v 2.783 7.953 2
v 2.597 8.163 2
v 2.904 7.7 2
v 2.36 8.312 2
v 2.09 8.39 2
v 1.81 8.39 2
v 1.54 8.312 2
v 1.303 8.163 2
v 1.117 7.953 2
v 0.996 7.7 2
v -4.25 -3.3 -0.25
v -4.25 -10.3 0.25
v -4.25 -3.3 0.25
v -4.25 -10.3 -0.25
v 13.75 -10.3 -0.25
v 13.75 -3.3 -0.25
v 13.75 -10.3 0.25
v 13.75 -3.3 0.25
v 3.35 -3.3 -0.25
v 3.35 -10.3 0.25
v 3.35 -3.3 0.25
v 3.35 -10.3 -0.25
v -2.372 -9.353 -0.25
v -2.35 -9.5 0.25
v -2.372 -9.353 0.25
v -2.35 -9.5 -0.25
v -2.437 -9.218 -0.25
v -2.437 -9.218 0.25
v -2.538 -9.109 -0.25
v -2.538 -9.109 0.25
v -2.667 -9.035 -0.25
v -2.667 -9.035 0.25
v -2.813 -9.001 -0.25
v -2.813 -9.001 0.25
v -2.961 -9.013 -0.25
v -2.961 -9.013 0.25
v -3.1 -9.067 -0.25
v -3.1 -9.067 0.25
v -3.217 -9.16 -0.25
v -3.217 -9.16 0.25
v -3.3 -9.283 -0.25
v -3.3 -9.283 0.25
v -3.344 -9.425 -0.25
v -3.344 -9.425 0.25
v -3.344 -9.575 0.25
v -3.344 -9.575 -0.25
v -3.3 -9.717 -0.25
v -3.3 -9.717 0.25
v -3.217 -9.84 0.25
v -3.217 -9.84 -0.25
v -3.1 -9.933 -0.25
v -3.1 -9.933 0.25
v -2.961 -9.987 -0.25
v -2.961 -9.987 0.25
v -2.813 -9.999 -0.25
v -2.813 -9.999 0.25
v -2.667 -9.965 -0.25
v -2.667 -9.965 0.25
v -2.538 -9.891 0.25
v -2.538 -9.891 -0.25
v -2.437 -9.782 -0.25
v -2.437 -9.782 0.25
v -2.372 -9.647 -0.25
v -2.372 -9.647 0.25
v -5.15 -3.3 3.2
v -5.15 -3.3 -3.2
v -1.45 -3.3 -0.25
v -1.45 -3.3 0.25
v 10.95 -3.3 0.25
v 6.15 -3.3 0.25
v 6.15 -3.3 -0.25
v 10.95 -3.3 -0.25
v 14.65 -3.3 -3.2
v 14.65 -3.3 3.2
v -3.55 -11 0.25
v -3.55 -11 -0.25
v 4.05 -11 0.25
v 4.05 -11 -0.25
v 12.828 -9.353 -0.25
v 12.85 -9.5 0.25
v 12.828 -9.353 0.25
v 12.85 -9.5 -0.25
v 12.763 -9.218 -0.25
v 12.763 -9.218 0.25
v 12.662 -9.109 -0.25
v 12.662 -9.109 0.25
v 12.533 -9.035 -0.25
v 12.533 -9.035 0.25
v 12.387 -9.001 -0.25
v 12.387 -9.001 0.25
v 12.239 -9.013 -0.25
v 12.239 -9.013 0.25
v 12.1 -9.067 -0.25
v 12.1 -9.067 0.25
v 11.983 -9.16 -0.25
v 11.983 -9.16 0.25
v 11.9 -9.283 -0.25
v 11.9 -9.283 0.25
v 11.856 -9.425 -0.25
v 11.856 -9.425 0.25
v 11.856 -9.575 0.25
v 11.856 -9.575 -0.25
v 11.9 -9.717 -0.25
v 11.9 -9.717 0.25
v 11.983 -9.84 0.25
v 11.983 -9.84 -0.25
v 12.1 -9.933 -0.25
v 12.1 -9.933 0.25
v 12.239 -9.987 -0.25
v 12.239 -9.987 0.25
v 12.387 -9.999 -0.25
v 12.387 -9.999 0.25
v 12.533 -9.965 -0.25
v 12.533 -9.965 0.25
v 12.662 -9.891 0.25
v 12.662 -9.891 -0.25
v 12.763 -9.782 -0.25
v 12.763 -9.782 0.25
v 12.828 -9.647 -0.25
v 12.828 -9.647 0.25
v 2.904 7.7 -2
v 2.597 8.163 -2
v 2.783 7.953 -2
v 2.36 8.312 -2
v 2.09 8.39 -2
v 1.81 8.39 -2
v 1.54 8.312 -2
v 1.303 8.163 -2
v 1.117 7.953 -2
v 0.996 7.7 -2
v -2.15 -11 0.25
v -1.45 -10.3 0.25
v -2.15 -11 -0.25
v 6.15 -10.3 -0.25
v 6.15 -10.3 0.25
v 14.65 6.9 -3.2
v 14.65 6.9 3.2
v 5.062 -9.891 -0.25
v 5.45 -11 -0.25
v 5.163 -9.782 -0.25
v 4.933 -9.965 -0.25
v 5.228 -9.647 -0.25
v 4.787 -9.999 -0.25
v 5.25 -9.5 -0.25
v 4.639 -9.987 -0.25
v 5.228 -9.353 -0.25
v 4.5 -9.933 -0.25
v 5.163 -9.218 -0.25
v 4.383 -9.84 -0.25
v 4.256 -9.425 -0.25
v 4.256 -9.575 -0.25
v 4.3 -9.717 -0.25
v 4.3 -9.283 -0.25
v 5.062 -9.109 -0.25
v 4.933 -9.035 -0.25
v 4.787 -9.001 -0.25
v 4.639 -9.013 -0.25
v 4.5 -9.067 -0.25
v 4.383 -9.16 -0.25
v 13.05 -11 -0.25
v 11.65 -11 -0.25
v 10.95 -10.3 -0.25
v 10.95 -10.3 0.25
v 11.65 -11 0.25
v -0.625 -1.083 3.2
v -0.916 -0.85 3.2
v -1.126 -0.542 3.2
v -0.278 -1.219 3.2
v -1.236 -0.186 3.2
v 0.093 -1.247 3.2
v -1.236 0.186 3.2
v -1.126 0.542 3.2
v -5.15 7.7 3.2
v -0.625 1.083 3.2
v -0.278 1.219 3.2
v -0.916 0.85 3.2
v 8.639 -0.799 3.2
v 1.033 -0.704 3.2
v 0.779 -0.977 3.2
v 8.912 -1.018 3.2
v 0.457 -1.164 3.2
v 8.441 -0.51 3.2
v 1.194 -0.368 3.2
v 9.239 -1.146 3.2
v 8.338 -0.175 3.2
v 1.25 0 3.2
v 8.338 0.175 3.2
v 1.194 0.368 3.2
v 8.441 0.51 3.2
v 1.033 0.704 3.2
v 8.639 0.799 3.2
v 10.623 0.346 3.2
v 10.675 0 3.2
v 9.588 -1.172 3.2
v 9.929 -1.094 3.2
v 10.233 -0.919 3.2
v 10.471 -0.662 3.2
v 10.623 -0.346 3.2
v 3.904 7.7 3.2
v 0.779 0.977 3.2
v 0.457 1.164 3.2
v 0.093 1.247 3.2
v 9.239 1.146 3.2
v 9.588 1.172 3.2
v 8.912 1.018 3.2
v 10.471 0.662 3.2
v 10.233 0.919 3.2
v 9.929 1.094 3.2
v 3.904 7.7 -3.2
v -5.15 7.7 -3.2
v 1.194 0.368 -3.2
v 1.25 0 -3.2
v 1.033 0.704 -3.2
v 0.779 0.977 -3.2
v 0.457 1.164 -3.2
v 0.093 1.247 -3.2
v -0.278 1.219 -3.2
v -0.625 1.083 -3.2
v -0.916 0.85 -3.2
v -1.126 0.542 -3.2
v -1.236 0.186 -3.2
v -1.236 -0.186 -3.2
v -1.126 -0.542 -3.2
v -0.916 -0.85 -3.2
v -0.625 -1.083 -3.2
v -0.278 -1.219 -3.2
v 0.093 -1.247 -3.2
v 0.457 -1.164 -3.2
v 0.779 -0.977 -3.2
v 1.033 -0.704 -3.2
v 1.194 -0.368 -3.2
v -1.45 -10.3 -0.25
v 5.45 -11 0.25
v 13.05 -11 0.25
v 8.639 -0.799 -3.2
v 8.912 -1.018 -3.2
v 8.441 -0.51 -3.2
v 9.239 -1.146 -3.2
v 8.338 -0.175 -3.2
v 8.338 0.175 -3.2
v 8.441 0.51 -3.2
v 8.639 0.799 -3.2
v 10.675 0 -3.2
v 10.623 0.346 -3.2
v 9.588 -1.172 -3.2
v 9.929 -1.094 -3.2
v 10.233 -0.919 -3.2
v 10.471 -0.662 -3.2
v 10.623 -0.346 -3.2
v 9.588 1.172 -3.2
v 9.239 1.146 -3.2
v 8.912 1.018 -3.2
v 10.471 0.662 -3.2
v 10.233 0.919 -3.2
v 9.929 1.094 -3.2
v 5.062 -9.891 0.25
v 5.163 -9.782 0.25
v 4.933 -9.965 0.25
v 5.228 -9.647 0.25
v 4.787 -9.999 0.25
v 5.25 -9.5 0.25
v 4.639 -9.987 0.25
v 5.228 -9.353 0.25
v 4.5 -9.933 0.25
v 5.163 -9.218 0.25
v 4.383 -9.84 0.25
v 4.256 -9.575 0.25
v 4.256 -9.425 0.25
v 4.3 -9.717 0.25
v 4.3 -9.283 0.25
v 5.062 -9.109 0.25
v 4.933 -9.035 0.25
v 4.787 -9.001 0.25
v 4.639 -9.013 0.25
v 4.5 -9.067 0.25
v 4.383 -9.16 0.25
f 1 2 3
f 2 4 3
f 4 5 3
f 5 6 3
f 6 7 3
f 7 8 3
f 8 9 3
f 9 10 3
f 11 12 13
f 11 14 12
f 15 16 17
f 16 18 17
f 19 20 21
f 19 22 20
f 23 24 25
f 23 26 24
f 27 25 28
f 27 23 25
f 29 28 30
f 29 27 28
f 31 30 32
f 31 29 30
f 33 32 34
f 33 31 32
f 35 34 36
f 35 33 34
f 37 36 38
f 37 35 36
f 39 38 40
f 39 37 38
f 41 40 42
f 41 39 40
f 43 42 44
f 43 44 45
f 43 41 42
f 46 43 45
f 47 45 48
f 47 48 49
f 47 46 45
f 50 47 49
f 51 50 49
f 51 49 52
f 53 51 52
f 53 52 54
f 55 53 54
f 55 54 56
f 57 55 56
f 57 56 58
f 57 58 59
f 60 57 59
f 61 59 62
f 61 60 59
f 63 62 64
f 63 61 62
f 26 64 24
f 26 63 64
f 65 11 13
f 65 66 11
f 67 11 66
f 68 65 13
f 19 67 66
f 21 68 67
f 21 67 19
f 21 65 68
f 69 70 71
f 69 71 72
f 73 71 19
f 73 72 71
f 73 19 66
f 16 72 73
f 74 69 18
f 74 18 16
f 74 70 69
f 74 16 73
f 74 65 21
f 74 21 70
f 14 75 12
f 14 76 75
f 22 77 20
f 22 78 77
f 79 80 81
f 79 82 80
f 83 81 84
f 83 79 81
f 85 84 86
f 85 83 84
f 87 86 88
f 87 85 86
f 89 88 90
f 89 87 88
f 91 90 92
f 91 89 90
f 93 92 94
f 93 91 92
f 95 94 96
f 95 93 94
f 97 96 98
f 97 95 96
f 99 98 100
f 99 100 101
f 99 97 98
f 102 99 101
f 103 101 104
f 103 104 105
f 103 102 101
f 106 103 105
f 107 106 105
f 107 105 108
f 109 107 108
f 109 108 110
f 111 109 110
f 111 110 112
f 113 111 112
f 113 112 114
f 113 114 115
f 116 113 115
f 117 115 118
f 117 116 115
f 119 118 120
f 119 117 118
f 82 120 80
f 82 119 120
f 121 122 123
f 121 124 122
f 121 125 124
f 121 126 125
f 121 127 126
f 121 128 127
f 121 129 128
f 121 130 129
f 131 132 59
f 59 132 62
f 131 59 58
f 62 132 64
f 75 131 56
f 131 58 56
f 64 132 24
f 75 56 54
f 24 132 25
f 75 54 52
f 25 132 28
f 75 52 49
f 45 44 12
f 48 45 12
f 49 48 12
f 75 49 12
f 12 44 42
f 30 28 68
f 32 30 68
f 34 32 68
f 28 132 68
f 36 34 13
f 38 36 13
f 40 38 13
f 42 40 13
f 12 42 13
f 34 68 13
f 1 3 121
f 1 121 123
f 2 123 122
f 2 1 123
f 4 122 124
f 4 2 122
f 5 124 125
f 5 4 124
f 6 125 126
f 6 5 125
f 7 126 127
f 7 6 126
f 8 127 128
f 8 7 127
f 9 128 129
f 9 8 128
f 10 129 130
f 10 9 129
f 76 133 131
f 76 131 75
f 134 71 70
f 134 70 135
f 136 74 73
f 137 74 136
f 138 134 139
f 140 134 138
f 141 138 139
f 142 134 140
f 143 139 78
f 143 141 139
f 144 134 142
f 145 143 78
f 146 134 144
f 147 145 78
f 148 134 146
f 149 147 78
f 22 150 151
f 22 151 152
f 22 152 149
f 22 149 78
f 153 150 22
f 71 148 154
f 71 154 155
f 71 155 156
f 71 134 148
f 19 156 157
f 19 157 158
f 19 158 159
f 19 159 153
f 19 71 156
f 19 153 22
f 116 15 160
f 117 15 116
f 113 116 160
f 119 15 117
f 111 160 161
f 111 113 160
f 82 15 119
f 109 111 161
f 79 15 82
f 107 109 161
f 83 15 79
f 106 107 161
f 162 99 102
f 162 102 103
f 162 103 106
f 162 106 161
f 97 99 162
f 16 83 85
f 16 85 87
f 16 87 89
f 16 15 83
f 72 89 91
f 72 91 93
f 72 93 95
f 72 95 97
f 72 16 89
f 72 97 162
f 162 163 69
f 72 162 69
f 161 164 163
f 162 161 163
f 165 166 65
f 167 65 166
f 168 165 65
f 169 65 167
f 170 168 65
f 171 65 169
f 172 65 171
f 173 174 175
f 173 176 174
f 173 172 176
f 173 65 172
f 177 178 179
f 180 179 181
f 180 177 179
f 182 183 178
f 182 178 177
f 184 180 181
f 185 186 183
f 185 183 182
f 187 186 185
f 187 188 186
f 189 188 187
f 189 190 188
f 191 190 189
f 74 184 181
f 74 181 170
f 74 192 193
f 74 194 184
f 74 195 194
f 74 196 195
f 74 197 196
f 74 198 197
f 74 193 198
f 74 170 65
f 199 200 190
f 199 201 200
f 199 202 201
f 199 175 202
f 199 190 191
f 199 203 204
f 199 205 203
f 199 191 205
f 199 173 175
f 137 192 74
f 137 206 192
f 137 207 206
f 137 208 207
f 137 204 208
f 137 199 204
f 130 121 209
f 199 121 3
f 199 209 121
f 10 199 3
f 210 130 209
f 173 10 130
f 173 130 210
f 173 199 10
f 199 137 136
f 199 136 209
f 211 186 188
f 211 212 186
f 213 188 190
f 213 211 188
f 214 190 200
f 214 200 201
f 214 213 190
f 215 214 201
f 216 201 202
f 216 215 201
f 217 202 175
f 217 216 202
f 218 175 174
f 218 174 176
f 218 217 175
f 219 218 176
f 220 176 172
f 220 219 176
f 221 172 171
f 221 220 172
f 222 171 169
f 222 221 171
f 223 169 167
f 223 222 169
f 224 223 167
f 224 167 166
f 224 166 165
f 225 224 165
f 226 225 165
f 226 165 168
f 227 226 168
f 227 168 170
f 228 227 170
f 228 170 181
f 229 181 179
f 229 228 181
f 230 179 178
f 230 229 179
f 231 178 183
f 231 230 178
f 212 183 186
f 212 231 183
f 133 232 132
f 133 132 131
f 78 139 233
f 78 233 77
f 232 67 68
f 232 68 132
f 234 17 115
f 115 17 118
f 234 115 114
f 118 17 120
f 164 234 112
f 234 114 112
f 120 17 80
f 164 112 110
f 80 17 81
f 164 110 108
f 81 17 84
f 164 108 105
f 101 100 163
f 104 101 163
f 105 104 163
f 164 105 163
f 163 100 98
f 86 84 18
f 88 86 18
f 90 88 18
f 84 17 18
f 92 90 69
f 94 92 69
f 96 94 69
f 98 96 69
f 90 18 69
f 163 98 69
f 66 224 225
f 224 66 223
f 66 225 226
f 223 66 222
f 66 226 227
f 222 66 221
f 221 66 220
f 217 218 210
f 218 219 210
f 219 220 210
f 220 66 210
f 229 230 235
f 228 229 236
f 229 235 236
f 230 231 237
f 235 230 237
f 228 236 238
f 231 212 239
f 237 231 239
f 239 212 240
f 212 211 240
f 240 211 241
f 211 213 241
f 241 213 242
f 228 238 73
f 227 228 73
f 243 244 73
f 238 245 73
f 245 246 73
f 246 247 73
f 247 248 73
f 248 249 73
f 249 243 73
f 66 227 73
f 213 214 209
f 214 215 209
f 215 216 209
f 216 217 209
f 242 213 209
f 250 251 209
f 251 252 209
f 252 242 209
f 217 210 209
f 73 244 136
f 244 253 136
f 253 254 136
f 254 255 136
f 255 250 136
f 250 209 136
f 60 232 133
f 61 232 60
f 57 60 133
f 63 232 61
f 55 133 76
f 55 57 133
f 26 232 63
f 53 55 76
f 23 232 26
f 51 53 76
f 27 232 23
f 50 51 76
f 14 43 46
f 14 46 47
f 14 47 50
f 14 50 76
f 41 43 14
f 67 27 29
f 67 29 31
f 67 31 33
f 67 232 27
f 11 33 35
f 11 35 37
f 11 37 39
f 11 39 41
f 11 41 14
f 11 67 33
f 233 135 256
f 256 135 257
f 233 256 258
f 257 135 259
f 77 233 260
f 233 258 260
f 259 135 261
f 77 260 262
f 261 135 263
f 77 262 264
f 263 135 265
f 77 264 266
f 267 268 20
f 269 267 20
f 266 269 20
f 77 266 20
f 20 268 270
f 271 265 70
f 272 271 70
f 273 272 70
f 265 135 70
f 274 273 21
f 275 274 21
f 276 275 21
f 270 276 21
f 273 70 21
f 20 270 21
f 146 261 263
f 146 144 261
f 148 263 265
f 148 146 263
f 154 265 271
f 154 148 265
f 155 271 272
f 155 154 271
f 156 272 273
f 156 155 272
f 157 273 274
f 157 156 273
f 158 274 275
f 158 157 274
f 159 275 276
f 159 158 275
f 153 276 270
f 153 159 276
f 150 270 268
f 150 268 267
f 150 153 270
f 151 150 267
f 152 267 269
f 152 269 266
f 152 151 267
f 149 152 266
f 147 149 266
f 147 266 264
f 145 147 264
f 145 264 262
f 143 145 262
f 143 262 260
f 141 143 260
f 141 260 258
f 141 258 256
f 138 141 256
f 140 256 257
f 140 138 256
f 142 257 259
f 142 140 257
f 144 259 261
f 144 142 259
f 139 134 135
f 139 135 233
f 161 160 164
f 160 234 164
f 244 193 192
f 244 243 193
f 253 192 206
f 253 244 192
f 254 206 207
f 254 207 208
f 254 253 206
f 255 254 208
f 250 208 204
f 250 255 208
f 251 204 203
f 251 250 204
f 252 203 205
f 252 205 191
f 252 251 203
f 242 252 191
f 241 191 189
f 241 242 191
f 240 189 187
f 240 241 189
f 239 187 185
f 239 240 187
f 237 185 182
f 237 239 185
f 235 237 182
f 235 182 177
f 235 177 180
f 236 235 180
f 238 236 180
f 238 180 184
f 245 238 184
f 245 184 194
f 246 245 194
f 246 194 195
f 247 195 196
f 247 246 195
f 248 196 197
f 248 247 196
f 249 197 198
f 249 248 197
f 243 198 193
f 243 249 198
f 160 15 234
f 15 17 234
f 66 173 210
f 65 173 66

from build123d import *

# Parameters (mm, degrees)
SKETCH1_R           = 1.25
SKETCH1_R_2         = 1.175
BOSS_EXTRUDE1_DEPTH = 3.2
SKETCH2_R           = 0.5
BOSS_EXTRUDE2_DEPTH = 0.25
SKETCH3_W           = 2.907878402
SKETCH3_H           = 1.2
CUT_EXTRUDE1_DEPTH  = 1.7


with BuildPart() as part:
    # Sketch1 → Boss-Extrude1 (new body, symmetric)
    with BuildSketch(Plane.XY):
        with BuildLine():
            Line((-5.15, -3.3), (14.65, -3.3))
            Line((14.65, -3.3), (14.65, 6.9))
            Line((14.65, 6.9), (3.903939201, 7.7))
            Line((3.903939201, 7.7), (2.903939201, 7.7))
            ThreePointArc((2.903939201, 7.7), (1.95, 8.4), (0.996060799, 7.7))
            Line((0.996060799, 7.7), (-5.15, 7.7))
            Line((-5.15, 7.7), (-5.15, -3.3))
        make_face()
        Circle(SKETCH1_R, mode=Mode.SUBTRACT)
        with Locations((9.5, 0)):
            Circle(SKETCH1_R_2, mode=Mode.SUBTRACT)
    extrude(amount=BOSS_EXTRUDE1_DEPTH, both=True)

    # Sketch2 → Boss-Extrude2 (add, symmetric)
    with BuildSketch(Plane.XY):
        Polygon((-4.25, -3.3), (-1.45, -3.3), (-1.45, -10.3), (-2.15, -11), (-3.55, -11), (-4.25, -10.3), align=None)
        with Locations((-2.85, -9.5)):
            Circle(SKETCH2_R, mode=Mode.SUBTRACT)
        Polygon((3.35, -3.3), (6.15, -3.3), (6.15, -10.3), (5.45, -11), (4.05, -11), (3.35, -10.3), align=None)
        with Locations((4.75, -9.5)):
            Circle(SKETCH2_R, mode=Mode.SUBTRACT)
        Polygon((10.95, -3.3), (13.75, -3.3), (13.75, -10.3), (13.05, -11), (11.65, -11), (10.95, -10.3), align=None)
        with Locations((12.35, -9.5)):
            Circle(SKETCH2_R, mode=Mode.SUBTRACT)
    extrude(amount=BOSS_EXTRUDE2_DEPTH, both=True)

    # Sketch3 → Cut-Extrude1 (cut, through all)
    with BuildSketch(Plane(origin=(0, 7.7, 0), x_dir=(1, 0, 0), z_dir=(0, 1, 0))):
        with Locations((2.45, 2.6)):
            Rectangle(SKETCH3_W, SKETCH3_H)
        with Locations((2.45, -2.6)):
            Rectangle(SKETCH3_W, SKETCH3_H)
    extrude(amount=CUT_EXTRUDE1_DEPTH, mode=Mode.SUBTRACT)


solid = part.part
